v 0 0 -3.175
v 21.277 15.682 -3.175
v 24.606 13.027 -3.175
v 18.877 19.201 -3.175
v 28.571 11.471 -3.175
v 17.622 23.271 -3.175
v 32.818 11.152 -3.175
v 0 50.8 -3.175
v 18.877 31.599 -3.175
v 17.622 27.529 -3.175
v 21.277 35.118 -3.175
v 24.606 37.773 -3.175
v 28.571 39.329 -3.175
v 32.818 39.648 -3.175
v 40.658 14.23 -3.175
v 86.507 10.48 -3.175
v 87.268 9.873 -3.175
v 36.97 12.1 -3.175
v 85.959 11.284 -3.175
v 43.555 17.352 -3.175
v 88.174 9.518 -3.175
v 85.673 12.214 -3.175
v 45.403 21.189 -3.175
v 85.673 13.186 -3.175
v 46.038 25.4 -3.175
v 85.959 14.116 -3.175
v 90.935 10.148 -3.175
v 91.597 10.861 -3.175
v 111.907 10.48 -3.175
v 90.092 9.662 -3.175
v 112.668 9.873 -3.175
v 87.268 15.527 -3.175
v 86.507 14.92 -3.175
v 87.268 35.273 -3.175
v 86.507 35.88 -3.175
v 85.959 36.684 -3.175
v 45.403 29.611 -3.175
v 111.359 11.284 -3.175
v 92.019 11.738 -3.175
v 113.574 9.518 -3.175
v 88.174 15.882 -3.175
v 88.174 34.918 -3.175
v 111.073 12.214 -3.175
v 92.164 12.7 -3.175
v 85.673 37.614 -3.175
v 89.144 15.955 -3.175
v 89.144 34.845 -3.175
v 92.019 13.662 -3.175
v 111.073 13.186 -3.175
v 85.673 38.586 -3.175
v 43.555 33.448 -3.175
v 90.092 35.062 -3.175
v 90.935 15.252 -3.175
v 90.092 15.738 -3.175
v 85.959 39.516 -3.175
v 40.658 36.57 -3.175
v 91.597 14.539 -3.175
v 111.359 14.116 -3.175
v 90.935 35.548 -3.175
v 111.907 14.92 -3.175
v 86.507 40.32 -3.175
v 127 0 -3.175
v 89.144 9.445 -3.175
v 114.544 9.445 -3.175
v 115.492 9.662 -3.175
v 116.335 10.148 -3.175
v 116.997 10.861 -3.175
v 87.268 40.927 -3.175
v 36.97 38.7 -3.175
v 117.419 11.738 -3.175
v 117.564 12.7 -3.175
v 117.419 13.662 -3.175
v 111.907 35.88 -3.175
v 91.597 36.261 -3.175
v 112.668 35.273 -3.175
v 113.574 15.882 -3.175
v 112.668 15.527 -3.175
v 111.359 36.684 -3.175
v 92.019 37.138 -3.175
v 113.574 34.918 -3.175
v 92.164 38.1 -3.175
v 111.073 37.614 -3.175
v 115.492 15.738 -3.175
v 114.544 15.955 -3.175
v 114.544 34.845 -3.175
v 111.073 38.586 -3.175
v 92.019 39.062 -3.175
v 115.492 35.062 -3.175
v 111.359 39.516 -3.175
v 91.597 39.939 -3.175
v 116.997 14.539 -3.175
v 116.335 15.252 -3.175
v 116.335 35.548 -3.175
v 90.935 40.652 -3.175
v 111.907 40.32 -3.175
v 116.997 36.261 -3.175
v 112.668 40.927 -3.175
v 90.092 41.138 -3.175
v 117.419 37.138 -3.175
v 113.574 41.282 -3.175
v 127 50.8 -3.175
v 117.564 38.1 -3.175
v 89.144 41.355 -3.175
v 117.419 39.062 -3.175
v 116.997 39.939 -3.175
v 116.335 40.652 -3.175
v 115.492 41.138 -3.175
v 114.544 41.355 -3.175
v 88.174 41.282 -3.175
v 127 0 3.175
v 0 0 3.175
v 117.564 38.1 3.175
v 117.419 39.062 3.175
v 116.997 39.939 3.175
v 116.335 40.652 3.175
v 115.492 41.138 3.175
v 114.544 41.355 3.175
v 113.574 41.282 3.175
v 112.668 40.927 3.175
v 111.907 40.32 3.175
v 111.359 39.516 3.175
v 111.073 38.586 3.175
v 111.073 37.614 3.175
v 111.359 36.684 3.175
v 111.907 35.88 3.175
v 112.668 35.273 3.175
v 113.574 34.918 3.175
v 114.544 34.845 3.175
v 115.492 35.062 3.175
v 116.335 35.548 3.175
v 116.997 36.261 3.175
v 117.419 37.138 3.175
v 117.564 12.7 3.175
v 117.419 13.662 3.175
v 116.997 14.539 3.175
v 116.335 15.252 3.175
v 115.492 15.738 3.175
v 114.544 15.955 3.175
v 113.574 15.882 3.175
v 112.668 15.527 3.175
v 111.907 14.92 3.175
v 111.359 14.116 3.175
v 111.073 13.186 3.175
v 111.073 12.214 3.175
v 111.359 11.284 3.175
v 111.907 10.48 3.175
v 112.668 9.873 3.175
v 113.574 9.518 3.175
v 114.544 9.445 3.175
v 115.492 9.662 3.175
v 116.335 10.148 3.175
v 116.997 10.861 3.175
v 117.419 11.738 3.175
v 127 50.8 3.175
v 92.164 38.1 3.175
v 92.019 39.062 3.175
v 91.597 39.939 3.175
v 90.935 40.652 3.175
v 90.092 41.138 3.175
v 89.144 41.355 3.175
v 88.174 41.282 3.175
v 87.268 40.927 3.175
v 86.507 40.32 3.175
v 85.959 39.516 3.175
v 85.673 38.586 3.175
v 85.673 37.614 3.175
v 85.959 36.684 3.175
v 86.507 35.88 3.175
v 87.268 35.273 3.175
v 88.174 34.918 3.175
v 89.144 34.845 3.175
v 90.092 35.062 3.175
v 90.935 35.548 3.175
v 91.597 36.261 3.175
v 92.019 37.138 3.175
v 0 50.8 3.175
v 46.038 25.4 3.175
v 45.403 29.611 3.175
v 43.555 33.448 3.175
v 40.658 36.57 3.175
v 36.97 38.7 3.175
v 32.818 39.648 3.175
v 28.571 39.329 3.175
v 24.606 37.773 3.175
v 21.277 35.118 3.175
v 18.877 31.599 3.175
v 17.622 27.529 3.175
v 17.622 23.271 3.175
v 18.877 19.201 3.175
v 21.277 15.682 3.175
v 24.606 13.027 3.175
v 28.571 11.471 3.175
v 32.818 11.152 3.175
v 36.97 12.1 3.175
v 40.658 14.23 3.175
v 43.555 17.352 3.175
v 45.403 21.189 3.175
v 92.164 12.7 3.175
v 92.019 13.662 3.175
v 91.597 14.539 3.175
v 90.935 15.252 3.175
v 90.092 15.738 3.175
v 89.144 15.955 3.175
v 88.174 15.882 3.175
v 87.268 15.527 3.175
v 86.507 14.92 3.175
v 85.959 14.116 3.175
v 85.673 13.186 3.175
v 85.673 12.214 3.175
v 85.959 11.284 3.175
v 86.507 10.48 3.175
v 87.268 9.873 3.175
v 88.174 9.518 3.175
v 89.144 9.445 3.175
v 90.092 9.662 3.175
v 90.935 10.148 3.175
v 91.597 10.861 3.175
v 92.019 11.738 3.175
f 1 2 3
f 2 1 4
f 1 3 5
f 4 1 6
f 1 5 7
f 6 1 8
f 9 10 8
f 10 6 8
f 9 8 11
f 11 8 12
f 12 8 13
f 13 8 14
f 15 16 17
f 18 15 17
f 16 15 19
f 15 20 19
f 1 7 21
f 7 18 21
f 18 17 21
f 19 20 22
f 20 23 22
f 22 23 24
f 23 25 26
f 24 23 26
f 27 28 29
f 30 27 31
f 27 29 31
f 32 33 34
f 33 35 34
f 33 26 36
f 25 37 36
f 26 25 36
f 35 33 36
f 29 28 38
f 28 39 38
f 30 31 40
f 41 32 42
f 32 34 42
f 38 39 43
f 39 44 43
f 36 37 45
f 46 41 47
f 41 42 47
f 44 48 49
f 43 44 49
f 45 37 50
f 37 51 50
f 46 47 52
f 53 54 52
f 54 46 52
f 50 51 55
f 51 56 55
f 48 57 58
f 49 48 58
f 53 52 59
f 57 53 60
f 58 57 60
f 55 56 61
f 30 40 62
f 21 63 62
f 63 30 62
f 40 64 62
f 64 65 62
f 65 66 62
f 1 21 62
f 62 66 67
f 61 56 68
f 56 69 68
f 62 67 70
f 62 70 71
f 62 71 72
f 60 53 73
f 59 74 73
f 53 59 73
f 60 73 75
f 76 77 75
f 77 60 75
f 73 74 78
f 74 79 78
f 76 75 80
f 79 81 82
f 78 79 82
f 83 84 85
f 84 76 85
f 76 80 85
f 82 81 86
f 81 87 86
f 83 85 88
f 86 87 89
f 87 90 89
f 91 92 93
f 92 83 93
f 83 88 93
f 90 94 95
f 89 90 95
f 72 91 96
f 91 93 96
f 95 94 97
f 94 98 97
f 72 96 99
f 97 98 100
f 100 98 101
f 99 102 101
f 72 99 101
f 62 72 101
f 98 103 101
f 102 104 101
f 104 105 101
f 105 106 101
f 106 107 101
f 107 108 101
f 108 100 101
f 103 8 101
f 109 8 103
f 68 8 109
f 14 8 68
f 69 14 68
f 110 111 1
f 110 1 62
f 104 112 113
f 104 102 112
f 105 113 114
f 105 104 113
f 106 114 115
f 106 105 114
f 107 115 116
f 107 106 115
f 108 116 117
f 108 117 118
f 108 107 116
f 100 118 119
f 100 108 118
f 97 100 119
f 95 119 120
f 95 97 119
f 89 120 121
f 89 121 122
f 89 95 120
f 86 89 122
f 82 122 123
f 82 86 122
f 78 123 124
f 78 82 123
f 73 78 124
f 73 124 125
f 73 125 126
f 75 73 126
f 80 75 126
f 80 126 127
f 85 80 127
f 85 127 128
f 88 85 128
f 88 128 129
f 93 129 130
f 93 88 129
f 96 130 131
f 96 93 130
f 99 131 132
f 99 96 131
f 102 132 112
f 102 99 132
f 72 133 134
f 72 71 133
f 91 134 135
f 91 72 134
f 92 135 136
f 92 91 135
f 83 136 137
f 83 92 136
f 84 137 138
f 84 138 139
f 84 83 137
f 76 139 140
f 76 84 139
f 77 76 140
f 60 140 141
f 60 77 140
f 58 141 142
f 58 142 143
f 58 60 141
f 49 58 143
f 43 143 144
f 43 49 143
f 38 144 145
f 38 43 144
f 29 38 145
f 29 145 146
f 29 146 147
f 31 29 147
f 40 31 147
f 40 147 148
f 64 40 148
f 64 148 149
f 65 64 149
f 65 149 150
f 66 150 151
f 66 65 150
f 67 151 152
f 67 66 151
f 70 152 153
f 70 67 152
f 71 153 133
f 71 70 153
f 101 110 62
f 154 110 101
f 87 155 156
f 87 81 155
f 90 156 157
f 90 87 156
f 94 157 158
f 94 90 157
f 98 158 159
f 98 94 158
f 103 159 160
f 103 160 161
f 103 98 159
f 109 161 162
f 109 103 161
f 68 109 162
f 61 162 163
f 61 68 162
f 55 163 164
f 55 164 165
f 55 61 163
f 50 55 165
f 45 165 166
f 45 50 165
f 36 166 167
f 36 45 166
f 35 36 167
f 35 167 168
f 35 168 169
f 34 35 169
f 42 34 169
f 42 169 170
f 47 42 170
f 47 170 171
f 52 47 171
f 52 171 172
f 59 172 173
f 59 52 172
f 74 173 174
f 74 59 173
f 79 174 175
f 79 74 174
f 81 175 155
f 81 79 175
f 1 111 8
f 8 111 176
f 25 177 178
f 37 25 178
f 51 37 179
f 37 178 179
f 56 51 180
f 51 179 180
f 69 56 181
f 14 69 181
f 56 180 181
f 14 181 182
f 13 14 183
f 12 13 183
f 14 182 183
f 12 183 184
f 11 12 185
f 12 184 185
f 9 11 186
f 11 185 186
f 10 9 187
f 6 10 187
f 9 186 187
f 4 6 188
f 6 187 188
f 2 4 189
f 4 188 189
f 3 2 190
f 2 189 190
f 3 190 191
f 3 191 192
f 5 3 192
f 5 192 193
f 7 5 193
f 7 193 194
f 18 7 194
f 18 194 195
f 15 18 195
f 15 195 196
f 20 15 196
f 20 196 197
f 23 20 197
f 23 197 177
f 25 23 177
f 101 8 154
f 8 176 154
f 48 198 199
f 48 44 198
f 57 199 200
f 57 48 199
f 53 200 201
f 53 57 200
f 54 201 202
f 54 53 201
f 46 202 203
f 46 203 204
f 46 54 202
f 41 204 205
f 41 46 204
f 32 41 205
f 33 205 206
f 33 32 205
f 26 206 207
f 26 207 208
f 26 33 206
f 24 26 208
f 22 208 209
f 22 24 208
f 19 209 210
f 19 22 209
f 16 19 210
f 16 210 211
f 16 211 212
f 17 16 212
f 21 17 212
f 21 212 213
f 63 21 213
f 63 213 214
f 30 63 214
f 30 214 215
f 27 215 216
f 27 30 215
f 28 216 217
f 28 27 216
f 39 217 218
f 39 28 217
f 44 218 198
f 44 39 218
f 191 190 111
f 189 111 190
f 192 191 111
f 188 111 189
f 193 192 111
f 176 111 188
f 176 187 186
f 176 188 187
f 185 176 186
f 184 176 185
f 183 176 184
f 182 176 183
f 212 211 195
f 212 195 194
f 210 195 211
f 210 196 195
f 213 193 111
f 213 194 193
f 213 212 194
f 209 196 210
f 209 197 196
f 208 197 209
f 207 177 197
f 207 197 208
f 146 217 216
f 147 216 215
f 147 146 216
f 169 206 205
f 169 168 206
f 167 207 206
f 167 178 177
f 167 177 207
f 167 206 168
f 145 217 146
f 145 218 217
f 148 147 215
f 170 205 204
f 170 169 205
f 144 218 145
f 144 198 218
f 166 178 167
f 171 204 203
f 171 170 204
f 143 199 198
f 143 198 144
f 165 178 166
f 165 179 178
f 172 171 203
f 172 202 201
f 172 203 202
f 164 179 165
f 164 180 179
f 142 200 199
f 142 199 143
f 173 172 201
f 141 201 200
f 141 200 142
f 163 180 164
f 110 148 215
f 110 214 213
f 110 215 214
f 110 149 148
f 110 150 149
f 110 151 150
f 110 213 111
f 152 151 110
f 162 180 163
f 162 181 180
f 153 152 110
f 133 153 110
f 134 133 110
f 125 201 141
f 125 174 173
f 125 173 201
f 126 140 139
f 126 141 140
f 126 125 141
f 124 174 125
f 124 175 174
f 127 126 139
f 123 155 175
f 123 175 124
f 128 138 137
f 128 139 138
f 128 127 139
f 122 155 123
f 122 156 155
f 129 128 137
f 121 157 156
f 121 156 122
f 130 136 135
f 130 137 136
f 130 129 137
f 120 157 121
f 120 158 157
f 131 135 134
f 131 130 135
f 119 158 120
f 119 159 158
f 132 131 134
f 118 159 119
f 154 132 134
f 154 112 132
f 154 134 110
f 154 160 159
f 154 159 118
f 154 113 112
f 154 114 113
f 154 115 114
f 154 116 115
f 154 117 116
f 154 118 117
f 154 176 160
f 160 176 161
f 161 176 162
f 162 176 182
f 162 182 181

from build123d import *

# Parameters (mm, degrees)
SKETCH1_W           = 127
SKETCH1_H           = 50.8
SKETCH1_R           = 3.2639
BOSS_EXTRUDE1_DEPTH = 3.175
SKETCH2_R           = 14.2875
CUT_EXTRUDE1_DEPTH  = 137.930502446


with BuildPart() as part:
    # Sketch1 → Boss-Extrude1 (new, symmetric)
    with BuildSketch(Plane.XY):
        with Locations((63.5, 25.4)):
            Rectangle(SKETCH1_W, SKETCH1_H)
        with Locations((88.9, 12.7)):
            Circle(SKETCH1_R, mode=Mode.SUBTRACT)
        with Locations((114.3, 12.7)):
            Circle(SKETCH1_R, mode=Mode.SUBTRACT)
        with Locations((88.9, 38.1)):
            Circle(SKETCH1_R, mode=Mode.SUBTRACT)
        with Locations((114.3, 38.1)):
            Circle(SKETCH1_R, mode=Mode.SUBTRACT)
    extrude(amount=BOSS_EXTRUDE1_DEPTH, both=True)

    # Sketch2 → Cut-Extrude1 (cut, through all)
    with BuildSketch(Plane.XY.offset(3.175)):
        with Locations((31.75, 25.4)):
            Circle(SKETCH2_R)
    extrude(amount=-CUT_EXTRUDE1_DEPTH, mode=Mode.SUBTRACT)


solid = part.part
